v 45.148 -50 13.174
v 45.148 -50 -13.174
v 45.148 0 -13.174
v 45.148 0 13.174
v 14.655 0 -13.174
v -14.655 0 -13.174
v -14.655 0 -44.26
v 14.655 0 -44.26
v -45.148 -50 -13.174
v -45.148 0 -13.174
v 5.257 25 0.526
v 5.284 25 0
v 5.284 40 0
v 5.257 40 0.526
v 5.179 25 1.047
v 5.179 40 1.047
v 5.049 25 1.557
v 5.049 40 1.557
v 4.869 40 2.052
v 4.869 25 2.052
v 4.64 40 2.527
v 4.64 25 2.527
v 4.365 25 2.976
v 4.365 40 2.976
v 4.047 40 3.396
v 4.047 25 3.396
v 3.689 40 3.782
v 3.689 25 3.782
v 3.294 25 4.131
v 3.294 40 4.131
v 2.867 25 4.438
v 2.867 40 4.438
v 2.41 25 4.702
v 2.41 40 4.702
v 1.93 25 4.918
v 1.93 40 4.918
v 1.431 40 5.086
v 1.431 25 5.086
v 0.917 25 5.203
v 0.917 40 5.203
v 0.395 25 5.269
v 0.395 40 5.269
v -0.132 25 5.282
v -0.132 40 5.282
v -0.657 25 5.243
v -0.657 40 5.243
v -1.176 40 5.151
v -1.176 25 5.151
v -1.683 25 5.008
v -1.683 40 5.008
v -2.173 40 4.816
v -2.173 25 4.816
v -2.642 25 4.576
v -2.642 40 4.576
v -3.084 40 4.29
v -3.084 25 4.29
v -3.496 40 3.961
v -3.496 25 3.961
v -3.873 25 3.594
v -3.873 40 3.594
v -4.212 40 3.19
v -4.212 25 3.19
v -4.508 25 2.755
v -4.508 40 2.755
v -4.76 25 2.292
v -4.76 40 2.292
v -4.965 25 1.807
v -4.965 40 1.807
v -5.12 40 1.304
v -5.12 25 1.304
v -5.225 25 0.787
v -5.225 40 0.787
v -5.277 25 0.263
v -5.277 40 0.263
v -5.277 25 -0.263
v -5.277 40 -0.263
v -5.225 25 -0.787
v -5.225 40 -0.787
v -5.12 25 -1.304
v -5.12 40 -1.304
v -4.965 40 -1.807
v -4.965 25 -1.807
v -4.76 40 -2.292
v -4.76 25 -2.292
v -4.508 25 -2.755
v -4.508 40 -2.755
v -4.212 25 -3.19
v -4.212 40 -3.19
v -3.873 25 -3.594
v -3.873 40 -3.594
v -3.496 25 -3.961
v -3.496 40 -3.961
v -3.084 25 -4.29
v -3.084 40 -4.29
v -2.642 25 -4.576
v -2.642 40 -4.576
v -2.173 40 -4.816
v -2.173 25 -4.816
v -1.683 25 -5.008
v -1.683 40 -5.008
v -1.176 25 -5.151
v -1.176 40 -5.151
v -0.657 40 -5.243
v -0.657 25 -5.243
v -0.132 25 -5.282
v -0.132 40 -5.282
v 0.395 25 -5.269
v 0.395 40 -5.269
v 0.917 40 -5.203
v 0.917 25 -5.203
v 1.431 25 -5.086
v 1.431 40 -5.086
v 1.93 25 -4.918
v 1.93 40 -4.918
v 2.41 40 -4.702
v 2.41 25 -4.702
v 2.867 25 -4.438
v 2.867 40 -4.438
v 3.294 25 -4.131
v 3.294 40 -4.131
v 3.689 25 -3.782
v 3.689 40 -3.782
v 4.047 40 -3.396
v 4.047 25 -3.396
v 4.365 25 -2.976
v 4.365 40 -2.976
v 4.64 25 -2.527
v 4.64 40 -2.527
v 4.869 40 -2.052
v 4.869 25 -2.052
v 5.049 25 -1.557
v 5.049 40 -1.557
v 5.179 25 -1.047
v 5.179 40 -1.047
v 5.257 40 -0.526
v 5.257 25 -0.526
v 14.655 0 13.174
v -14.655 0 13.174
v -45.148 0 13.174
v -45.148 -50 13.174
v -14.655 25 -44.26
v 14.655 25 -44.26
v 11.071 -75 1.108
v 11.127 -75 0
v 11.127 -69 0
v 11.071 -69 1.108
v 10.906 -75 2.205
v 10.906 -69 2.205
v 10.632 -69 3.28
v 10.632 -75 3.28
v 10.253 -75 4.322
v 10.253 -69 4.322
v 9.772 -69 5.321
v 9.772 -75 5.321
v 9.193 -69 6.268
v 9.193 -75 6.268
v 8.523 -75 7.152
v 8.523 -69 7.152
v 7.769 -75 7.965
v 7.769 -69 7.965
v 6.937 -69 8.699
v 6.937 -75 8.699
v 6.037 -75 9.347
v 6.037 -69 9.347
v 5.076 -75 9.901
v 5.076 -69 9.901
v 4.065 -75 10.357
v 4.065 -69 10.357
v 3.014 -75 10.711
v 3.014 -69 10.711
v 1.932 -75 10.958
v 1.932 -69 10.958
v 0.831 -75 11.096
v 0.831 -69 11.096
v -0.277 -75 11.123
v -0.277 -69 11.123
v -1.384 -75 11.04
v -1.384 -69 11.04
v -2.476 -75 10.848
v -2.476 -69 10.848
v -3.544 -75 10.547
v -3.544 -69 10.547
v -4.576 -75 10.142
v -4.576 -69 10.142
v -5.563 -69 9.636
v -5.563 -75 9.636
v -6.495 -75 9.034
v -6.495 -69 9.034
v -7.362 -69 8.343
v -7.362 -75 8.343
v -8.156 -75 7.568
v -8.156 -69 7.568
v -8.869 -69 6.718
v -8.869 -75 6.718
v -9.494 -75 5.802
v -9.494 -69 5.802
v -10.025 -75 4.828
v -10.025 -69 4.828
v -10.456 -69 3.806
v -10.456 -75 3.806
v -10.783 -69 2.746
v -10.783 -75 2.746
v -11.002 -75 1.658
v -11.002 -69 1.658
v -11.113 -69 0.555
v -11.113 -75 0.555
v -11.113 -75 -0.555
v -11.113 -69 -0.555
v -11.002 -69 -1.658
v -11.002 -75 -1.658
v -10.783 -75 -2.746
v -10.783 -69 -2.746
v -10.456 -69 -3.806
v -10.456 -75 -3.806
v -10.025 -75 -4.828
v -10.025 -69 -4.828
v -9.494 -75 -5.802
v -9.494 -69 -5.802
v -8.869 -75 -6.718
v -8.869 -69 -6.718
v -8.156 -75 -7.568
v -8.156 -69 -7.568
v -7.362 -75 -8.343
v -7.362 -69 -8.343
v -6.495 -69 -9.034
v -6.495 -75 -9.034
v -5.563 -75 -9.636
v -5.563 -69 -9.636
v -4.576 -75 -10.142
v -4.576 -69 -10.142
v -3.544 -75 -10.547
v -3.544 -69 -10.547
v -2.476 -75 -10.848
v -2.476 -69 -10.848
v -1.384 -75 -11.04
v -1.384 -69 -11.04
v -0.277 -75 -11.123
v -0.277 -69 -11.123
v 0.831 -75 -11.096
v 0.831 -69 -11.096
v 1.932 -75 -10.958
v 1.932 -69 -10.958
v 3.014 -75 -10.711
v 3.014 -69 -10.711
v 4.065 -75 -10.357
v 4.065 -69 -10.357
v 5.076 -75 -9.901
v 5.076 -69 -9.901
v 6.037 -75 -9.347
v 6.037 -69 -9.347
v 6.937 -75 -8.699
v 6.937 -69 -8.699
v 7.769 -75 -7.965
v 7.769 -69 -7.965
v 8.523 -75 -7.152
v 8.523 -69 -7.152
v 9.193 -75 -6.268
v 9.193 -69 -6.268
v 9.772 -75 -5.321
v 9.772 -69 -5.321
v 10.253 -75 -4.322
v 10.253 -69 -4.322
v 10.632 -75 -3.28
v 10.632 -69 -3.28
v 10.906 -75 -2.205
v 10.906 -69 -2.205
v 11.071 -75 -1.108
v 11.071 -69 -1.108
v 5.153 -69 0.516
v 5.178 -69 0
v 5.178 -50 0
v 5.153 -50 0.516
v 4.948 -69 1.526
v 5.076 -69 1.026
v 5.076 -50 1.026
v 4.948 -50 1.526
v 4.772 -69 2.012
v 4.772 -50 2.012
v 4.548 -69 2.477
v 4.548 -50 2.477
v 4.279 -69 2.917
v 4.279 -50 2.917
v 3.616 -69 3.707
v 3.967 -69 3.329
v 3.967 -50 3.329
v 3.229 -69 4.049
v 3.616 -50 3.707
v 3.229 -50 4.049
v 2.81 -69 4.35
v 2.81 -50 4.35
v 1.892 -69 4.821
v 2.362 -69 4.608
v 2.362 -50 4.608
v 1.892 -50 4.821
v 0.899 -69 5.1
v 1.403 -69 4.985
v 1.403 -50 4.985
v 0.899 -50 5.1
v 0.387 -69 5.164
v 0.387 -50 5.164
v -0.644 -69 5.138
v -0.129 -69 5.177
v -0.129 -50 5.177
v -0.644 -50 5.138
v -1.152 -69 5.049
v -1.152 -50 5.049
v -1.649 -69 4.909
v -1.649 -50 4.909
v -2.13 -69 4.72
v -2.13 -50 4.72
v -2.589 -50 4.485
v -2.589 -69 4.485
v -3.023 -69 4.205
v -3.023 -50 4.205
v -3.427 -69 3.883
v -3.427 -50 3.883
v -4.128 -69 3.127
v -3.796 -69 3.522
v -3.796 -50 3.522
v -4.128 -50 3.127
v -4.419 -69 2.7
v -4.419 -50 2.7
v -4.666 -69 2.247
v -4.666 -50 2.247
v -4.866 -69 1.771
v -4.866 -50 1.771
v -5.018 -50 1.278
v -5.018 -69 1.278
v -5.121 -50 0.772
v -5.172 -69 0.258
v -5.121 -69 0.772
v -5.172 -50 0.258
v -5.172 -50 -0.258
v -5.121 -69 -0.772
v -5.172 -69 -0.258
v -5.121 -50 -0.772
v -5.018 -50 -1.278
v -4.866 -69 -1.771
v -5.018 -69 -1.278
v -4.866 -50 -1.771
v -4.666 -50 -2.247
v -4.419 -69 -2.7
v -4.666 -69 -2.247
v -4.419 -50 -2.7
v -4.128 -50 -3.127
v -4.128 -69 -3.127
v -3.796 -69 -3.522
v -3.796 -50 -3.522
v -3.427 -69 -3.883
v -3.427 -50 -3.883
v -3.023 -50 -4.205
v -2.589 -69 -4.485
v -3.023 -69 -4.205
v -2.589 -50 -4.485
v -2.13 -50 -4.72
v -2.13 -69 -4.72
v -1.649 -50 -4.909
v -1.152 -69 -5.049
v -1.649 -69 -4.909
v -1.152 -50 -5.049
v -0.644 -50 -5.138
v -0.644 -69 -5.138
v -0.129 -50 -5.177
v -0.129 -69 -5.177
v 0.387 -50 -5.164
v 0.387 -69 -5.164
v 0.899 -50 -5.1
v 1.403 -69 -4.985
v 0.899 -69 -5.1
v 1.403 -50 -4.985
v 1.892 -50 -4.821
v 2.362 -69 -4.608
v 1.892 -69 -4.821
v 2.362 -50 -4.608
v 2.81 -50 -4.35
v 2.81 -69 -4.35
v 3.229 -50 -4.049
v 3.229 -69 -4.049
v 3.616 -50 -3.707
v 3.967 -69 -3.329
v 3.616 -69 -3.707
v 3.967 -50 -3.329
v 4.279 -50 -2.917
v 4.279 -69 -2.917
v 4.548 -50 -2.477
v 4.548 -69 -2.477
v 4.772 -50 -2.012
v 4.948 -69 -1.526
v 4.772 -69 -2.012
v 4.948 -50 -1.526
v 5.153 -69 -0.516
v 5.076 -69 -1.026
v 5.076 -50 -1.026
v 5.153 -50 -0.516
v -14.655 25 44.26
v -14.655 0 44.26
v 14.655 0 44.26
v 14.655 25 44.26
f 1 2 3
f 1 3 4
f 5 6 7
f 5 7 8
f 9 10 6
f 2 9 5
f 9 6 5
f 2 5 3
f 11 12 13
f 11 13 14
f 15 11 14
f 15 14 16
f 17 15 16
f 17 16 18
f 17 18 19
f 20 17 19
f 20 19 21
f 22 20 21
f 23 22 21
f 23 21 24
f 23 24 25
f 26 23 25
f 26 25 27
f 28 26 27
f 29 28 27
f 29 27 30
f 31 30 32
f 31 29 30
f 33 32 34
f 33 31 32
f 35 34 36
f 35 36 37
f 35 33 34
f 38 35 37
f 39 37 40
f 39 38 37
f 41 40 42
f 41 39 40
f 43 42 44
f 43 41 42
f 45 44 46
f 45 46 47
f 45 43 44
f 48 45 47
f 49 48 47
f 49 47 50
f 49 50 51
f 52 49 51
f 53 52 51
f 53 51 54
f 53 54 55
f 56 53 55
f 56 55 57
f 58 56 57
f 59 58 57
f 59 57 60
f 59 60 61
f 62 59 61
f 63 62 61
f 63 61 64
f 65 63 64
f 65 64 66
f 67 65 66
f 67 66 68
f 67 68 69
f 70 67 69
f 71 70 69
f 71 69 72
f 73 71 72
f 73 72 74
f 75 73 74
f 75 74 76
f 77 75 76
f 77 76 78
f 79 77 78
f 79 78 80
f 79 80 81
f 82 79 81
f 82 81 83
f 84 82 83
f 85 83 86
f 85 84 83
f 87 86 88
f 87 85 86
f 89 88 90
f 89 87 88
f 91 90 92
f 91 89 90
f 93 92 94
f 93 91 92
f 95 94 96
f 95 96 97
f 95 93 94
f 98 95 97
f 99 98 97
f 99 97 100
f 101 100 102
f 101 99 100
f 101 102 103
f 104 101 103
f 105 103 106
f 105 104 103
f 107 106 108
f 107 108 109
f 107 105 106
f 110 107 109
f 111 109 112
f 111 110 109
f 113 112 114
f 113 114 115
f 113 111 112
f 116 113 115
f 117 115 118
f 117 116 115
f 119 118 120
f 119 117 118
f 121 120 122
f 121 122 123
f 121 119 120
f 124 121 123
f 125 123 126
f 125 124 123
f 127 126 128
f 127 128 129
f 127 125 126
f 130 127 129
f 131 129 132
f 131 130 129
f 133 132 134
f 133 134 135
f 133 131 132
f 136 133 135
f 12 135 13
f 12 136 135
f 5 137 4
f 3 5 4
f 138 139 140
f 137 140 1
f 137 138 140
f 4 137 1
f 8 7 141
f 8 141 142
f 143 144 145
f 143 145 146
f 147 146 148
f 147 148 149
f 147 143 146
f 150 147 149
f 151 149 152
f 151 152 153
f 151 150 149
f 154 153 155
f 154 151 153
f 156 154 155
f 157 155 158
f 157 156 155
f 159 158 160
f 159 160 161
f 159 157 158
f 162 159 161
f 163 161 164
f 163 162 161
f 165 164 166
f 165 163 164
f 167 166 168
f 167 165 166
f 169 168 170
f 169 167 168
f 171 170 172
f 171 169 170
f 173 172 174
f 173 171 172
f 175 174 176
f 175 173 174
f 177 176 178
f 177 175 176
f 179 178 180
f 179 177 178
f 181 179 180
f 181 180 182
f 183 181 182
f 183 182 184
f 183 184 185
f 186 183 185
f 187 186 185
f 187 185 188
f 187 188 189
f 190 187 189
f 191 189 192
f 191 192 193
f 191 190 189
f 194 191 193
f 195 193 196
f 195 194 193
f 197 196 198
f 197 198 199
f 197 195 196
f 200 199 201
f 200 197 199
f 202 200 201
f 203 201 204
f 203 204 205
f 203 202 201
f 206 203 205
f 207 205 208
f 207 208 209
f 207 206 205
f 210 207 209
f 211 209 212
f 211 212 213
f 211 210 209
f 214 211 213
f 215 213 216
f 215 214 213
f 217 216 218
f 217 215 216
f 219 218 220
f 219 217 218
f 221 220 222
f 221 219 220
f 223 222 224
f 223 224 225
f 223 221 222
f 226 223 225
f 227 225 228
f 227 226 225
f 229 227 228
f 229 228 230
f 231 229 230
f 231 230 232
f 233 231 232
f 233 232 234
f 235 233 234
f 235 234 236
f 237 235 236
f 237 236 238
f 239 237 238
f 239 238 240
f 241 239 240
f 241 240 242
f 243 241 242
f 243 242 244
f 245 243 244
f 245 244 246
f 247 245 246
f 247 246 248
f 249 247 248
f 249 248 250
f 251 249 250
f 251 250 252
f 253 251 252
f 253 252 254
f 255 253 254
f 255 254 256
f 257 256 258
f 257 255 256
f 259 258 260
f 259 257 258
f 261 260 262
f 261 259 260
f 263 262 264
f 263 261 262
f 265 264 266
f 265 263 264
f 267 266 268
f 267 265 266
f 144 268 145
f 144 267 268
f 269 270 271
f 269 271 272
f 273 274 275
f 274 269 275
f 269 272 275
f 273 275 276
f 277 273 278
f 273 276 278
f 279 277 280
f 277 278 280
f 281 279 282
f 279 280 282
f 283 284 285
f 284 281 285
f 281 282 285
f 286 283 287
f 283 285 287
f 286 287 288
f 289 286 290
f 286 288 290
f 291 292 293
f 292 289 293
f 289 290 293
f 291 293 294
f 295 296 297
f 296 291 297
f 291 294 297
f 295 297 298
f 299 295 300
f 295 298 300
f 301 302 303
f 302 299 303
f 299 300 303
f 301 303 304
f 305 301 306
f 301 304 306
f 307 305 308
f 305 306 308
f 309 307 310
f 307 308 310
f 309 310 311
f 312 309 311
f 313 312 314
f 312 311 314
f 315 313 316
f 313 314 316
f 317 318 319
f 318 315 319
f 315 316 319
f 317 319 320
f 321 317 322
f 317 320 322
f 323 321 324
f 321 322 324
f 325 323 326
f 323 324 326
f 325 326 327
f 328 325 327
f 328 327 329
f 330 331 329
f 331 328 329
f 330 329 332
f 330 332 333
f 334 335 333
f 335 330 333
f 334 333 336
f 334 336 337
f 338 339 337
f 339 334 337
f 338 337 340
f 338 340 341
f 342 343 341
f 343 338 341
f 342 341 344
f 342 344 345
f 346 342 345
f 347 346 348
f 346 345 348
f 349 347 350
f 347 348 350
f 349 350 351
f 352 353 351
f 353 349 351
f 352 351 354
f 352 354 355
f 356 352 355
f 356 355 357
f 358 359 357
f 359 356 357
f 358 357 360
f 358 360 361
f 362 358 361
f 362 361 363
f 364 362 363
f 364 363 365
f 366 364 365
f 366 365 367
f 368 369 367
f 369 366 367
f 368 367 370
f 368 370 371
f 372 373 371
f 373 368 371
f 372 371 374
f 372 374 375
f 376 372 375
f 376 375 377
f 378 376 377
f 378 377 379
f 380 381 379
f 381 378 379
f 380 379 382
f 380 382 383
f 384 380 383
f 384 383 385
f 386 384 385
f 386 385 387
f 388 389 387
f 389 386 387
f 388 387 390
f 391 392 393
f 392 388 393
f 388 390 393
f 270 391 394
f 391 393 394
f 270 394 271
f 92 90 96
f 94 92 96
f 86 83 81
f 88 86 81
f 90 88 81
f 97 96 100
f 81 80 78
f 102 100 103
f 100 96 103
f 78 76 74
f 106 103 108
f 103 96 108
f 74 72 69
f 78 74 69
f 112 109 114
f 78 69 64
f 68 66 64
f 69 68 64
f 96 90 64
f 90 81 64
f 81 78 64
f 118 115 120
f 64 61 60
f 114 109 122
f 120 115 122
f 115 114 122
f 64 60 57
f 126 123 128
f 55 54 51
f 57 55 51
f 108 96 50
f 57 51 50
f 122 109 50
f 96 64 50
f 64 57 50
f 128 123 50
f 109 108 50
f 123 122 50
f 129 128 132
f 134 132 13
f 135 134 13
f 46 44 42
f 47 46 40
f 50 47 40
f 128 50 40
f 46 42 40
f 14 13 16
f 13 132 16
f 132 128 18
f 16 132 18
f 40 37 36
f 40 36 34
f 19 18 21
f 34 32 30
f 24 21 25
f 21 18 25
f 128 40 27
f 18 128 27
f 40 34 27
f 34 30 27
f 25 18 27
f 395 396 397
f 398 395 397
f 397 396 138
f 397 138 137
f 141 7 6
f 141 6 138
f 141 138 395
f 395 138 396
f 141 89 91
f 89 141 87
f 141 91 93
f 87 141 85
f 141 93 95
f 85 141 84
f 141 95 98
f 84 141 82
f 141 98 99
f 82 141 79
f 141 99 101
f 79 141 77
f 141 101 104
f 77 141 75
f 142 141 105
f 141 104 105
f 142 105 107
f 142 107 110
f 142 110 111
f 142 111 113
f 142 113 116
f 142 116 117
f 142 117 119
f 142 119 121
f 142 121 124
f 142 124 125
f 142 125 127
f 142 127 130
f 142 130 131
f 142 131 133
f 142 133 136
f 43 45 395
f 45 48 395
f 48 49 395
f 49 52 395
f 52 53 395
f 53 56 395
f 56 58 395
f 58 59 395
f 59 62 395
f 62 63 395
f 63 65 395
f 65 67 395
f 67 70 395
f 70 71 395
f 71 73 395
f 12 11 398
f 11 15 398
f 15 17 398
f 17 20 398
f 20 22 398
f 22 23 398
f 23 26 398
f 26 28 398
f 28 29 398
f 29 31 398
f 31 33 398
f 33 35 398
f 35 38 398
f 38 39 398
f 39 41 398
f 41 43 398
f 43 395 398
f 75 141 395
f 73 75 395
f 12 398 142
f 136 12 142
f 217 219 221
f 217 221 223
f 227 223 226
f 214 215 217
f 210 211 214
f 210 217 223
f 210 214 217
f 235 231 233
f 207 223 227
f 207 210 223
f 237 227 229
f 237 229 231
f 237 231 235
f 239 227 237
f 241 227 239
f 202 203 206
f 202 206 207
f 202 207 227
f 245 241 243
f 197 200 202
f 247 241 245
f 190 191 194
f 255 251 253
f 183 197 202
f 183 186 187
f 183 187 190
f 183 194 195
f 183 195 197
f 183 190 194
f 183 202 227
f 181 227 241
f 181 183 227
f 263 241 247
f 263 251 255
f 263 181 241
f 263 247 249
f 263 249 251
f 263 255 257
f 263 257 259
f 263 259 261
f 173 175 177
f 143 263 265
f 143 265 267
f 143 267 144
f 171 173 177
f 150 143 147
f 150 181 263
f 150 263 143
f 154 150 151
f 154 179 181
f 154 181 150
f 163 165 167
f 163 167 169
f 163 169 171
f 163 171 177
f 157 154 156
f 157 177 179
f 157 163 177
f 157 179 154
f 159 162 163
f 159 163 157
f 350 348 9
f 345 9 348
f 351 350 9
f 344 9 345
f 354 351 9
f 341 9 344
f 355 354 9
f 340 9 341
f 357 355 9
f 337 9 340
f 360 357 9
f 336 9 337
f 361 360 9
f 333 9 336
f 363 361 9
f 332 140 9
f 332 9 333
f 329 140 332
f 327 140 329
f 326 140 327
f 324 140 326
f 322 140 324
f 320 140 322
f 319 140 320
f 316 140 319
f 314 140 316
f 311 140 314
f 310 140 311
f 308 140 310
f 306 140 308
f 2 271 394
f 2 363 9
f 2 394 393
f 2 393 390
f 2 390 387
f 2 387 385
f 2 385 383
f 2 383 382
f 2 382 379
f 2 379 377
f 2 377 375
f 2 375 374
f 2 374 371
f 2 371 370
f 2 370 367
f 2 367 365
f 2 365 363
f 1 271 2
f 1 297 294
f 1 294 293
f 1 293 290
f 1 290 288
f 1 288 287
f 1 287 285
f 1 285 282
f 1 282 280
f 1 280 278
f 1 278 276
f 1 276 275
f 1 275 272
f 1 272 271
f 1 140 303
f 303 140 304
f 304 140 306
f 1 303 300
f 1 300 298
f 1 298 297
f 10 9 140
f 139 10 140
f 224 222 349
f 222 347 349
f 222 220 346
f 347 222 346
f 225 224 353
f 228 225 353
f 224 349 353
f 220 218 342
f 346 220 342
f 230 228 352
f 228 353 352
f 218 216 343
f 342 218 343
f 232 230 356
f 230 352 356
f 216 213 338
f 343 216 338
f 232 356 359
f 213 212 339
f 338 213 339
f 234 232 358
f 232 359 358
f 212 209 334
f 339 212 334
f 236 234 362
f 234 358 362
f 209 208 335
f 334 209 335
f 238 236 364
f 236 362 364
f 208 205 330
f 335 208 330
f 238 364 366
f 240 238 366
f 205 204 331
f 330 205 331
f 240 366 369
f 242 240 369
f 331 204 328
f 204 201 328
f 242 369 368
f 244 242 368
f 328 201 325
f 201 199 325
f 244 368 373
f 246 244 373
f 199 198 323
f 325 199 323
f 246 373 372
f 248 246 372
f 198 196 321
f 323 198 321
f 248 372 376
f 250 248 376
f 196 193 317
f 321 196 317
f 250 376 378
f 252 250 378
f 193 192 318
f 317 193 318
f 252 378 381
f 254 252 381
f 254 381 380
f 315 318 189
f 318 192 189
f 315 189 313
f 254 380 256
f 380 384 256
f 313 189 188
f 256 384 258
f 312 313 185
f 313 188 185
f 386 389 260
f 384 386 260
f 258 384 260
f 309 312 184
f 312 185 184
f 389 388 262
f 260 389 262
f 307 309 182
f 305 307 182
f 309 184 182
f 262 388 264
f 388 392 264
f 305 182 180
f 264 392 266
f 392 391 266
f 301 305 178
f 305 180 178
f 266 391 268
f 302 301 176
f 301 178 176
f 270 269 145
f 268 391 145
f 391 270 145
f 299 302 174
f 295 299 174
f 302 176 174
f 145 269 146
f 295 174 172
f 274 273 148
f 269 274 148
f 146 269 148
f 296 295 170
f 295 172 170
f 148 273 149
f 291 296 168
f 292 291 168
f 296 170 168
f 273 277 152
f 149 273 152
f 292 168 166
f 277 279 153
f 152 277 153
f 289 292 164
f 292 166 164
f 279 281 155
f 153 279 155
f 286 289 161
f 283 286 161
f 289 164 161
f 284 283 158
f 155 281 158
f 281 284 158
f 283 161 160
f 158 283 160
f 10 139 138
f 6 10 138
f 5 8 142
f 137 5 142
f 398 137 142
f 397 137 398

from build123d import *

# Parameters (mm, degrees)
F0_W      = 90.29606
F0_H      = 26.348686
F1_DEPTH  = 50
F2_W      = 29.309216
F2_H      = 88.519738
F3_DEPTH  = 25
F4_R      = 8.4699
F5_DEPTH  = 25
F6_R      = 5.178495
F7_DEPTH  = 70
F8_R      = 5.283524
F9_DEPTH  = 40
F12_R     = 11.126617
F13_DEPTH = 6


with BuildPart() as f1:
    # F0 (on Front) → F1 (new body)
    with BuildSketch(Plane.XZ):
        Rectangle(F0_W, F0_H)
    extrude(amount=F1_DEPTH)

    # F2 (on Front) → F3 (join)
    with BuildSketch(Plane.XZ):
        Rectangle(F2_W, F2_H)
    extrude(amount=-F3_DEPTH)



with BuildPart() as f5:
    # F4 (on Front) → F5 (new body)
    with BuildSketch(Plane.XZ):
        Circle(F4_R)
    extrude(amount=F5_DEPTH)


with BuildPart() as f1_1:
    add(f1.part)

    add(f5.part)  # F7 merges F5
    # F6 (on Front) → F7 (join)
    with BuildSketch(Plane.XZ):
        Circle(F6_R)
    extrude(amount=F7_DEPTH)

    # F8 (on Front) → F9 (join)
    with BuildSketch(Plane.XZ):
        Circle(F8_R)
    extrude(amount=-F9_DEPTH)

    # F12 (on offset) → F13 (join)
    with BuildSketch(Plane.XZ.offset(75)):
        Circle(F12_R)
    extrude(amount=-F13_DEPTH)


solid = f1_1.part
